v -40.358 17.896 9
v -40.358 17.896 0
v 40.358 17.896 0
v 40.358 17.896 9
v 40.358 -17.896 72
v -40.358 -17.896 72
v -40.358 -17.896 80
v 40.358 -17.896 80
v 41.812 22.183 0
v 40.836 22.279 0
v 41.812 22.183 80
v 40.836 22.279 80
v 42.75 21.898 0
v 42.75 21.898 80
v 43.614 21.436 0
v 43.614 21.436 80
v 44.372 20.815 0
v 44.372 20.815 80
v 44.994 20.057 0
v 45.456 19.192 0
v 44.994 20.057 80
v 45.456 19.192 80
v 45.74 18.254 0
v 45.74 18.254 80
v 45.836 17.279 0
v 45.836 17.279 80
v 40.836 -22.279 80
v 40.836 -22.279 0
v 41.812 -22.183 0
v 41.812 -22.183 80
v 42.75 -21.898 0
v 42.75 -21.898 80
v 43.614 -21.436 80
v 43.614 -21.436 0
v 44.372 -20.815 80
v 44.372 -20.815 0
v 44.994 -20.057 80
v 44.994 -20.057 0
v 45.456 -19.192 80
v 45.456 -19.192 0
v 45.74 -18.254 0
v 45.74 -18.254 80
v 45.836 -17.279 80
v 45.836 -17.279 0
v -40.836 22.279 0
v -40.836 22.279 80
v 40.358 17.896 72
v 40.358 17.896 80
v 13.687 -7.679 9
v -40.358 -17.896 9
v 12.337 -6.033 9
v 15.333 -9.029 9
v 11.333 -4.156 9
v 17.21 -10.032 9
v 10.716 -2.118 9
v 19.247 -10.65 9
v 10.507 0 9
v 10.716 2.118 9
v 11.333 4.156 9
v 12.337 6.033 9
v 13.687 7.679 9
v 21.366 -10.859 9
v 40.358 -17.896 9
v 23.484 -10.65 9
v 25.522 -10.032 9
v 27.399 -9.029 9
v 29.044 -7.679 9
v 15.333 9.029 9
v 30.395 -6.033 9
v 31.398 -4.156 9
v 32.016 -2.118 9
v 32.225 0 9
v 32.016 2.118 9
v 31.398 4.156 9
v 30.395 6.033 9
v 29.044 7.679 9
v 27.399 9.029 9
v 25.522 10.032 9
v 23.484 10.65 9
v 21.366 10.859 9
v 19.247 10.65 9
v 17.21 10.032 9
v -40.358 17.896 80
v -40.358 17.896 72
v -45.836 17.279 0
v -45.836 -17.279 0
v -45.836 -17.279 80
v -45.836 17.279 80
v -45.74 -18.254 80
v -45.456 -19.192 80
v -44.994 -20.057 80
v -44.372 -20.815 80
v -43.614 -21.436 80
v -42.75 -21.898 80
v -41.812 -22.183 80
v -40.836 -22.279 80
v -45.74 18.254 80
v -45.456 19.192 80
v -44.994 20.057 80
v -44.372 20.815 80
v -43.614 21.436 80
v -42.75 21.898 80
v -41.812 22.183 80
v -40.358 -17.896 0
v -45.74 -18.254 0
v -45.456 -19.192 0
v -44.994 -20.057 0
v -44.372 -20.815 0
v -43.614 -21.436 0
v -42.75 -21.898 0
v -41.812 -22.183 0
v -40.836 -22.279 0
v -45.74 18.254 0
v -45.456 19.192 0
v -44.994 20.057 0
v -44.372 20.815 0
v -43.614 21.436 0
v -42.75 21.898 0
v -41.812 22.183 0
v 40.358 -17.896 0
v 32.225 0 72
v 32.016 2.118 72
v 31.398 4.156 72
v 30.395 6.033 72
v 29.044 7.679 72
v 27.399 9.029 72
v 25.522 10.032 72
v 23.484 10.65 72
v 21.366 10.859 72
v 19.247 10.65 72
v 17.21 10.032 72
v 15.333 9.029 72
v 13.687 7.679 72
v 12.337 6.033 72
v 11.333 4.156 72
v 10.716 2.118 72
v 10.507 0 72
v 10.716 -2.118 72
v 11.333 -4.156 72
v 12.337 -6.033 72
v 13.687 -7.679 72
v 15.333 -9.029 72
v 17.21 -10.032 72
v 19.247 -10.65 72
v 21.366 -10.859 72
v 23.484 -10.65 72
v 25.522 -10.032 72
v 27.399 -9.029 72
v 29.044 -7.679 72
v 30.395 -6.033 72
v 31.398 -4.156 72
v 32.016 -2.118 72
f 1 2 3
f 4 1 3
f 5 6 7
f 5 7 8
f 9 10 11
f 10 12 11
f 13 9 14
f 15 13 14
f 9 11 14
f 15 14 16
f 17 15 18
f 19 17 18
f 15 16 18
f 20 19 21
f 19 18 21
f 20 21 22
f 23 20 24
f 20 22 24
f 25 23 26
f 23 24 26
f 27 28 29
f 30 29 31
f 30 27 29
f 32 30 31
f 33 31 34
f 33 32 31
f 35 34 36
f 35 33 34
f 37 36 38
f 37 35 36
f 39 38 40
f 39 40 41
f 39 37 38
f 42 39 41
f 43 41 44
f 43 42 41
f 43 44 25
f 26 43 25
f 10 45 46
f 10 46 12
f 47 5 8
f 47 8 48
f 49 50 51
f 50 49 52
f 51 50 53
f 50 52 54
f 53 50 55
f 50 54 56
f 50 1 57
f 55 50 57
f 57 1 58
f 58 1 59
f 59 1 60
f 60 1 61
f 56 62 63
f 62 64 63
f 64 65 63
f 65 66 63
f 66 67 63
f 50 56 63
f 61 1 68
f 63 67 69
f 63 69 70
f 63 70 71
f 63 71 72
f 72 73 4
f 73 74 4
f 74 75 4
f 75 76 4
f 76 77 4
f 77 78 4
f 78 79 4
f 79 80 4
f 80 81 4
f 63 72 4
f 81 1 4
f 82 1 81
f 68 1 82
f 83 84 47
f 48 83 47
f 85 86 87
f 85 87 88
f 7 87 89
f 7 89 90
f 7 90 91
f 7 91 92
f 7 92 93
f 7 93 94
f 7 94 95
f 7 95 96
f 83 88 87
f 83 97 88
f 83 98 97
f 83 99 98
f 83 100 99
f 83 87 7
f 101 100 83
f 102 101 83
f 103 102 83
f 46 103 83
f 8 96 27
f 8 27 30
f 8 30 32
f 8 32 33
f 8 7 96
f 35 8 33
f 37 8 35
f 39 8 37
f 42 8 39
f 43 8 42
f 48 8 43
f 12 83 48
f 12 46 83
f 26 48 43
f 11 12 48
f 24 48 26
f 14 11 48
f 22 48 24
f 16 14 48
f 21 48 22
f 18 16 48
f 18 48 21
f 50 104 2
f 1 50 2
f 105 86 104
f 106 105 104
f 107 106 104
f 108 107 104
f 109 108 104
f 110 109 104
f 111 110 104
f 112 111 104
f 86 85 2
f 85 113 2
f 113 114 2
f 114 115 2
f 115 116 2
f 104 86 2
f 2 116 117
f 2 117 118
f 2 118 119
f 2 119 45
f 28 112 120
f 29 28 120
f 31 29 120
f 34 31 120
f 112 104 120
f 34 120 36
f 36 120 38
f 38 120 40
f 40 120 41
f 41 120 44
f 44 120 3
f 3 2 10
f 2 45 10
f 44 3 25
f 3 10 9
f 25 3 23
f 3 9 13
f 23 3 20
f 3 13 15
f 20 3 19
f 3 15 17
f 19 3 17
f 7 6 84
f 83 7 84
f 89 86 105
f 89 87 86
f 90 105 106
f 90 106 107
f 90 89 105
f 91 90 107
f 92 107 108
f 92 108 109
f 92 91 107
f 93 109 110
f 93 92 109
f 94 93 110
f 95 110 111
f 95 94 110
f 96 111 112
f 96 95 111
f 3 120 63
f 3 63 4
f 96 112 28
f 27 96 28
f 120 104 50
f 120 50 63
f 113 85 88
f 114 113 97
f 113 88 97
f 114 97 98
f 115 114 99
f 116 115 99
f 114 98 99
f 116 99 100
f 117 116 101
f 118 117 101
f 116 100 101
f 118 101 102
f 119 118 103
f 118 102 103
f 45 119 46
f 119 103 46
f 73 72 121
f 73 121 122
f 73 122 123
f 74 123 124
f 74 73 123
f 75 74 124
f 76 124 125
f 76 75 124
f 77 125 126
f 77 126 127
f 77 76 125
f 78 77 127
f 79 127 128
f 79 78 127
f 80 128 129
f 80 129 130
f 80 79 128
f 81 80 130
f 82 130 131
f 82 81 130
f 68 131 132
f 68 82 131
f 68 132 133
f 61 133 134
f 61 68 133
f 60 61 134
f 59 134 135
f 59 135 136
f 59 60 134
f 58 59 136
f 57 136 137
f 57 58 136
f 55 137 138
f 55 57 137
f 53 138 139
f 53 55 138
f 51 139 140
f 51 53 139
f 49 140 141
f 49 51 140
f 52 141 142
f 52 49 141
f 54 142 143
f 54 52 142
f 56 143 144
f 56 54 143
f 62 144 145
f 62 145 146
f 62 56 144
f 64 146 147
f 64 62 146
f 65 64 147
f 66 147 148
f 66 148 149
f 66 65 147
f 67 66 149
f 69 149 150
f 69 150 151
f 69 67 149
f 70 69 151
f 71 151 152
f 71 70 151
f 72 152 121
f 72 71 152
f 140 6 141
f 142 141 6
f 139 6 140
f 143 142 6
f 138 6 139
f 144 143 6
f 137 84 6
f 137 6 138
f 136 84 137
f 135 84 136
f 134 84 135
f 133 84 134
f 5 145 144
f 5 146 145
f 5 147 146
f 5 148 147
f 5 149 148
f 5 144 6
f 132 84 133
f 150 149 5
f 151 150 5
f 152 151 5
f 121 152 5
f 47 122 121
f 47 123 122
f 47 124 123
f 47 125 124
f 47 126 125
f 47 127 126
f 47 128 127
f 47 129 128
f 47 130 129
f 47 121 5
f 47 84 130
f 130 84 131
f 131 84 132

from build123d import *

# Parameters (mm, degrees)
F0_W     = 91.6726738214
F0_H     = 44.5580258965
F0_W_2   = 80.7157829404
F0_H_2   = 35.7925109565
F1_DEPTH = 80
F2_START = 9
F0_R     = 10.8590602413
F2_DEPTH = 63
F3_R     = 5


with BuildPart() as f1:
    # F0 (on Top) → F1 (new body)
    with BuildSketch(Plane.XY):
        Rectangle(F0_W, F0_H)
        Rectangle(F0_W_2, F0_H_2, mode=Mode.SUBTRACT)
    extrude(amount=F1_DEPTH)

    # F0 (on Top) → F2 (join)
    with BuildSketch(Plane.XY.offset(F2_START)):
        Rectangle(F0_W_2, F0_H_2)
        with Locations((21.3659498841, 0)):
            Circle(F0_R, mode=Mode.SUBTRACT)
    extrude(amount=F2_DEPTH)

    # F3
    f3_edges = [f1.edges().sort_by_distance(p)[0] for p in [
        (45.836337, -22.279013, 40),
        (45.836337, 22.279013, 40),
        (-45.836337, 22.279013, 40),
        (-45.836337, -22.279013, 40),
    ]]
    fillet(f3_edges, radius=F3_R)


solid = f1.part
